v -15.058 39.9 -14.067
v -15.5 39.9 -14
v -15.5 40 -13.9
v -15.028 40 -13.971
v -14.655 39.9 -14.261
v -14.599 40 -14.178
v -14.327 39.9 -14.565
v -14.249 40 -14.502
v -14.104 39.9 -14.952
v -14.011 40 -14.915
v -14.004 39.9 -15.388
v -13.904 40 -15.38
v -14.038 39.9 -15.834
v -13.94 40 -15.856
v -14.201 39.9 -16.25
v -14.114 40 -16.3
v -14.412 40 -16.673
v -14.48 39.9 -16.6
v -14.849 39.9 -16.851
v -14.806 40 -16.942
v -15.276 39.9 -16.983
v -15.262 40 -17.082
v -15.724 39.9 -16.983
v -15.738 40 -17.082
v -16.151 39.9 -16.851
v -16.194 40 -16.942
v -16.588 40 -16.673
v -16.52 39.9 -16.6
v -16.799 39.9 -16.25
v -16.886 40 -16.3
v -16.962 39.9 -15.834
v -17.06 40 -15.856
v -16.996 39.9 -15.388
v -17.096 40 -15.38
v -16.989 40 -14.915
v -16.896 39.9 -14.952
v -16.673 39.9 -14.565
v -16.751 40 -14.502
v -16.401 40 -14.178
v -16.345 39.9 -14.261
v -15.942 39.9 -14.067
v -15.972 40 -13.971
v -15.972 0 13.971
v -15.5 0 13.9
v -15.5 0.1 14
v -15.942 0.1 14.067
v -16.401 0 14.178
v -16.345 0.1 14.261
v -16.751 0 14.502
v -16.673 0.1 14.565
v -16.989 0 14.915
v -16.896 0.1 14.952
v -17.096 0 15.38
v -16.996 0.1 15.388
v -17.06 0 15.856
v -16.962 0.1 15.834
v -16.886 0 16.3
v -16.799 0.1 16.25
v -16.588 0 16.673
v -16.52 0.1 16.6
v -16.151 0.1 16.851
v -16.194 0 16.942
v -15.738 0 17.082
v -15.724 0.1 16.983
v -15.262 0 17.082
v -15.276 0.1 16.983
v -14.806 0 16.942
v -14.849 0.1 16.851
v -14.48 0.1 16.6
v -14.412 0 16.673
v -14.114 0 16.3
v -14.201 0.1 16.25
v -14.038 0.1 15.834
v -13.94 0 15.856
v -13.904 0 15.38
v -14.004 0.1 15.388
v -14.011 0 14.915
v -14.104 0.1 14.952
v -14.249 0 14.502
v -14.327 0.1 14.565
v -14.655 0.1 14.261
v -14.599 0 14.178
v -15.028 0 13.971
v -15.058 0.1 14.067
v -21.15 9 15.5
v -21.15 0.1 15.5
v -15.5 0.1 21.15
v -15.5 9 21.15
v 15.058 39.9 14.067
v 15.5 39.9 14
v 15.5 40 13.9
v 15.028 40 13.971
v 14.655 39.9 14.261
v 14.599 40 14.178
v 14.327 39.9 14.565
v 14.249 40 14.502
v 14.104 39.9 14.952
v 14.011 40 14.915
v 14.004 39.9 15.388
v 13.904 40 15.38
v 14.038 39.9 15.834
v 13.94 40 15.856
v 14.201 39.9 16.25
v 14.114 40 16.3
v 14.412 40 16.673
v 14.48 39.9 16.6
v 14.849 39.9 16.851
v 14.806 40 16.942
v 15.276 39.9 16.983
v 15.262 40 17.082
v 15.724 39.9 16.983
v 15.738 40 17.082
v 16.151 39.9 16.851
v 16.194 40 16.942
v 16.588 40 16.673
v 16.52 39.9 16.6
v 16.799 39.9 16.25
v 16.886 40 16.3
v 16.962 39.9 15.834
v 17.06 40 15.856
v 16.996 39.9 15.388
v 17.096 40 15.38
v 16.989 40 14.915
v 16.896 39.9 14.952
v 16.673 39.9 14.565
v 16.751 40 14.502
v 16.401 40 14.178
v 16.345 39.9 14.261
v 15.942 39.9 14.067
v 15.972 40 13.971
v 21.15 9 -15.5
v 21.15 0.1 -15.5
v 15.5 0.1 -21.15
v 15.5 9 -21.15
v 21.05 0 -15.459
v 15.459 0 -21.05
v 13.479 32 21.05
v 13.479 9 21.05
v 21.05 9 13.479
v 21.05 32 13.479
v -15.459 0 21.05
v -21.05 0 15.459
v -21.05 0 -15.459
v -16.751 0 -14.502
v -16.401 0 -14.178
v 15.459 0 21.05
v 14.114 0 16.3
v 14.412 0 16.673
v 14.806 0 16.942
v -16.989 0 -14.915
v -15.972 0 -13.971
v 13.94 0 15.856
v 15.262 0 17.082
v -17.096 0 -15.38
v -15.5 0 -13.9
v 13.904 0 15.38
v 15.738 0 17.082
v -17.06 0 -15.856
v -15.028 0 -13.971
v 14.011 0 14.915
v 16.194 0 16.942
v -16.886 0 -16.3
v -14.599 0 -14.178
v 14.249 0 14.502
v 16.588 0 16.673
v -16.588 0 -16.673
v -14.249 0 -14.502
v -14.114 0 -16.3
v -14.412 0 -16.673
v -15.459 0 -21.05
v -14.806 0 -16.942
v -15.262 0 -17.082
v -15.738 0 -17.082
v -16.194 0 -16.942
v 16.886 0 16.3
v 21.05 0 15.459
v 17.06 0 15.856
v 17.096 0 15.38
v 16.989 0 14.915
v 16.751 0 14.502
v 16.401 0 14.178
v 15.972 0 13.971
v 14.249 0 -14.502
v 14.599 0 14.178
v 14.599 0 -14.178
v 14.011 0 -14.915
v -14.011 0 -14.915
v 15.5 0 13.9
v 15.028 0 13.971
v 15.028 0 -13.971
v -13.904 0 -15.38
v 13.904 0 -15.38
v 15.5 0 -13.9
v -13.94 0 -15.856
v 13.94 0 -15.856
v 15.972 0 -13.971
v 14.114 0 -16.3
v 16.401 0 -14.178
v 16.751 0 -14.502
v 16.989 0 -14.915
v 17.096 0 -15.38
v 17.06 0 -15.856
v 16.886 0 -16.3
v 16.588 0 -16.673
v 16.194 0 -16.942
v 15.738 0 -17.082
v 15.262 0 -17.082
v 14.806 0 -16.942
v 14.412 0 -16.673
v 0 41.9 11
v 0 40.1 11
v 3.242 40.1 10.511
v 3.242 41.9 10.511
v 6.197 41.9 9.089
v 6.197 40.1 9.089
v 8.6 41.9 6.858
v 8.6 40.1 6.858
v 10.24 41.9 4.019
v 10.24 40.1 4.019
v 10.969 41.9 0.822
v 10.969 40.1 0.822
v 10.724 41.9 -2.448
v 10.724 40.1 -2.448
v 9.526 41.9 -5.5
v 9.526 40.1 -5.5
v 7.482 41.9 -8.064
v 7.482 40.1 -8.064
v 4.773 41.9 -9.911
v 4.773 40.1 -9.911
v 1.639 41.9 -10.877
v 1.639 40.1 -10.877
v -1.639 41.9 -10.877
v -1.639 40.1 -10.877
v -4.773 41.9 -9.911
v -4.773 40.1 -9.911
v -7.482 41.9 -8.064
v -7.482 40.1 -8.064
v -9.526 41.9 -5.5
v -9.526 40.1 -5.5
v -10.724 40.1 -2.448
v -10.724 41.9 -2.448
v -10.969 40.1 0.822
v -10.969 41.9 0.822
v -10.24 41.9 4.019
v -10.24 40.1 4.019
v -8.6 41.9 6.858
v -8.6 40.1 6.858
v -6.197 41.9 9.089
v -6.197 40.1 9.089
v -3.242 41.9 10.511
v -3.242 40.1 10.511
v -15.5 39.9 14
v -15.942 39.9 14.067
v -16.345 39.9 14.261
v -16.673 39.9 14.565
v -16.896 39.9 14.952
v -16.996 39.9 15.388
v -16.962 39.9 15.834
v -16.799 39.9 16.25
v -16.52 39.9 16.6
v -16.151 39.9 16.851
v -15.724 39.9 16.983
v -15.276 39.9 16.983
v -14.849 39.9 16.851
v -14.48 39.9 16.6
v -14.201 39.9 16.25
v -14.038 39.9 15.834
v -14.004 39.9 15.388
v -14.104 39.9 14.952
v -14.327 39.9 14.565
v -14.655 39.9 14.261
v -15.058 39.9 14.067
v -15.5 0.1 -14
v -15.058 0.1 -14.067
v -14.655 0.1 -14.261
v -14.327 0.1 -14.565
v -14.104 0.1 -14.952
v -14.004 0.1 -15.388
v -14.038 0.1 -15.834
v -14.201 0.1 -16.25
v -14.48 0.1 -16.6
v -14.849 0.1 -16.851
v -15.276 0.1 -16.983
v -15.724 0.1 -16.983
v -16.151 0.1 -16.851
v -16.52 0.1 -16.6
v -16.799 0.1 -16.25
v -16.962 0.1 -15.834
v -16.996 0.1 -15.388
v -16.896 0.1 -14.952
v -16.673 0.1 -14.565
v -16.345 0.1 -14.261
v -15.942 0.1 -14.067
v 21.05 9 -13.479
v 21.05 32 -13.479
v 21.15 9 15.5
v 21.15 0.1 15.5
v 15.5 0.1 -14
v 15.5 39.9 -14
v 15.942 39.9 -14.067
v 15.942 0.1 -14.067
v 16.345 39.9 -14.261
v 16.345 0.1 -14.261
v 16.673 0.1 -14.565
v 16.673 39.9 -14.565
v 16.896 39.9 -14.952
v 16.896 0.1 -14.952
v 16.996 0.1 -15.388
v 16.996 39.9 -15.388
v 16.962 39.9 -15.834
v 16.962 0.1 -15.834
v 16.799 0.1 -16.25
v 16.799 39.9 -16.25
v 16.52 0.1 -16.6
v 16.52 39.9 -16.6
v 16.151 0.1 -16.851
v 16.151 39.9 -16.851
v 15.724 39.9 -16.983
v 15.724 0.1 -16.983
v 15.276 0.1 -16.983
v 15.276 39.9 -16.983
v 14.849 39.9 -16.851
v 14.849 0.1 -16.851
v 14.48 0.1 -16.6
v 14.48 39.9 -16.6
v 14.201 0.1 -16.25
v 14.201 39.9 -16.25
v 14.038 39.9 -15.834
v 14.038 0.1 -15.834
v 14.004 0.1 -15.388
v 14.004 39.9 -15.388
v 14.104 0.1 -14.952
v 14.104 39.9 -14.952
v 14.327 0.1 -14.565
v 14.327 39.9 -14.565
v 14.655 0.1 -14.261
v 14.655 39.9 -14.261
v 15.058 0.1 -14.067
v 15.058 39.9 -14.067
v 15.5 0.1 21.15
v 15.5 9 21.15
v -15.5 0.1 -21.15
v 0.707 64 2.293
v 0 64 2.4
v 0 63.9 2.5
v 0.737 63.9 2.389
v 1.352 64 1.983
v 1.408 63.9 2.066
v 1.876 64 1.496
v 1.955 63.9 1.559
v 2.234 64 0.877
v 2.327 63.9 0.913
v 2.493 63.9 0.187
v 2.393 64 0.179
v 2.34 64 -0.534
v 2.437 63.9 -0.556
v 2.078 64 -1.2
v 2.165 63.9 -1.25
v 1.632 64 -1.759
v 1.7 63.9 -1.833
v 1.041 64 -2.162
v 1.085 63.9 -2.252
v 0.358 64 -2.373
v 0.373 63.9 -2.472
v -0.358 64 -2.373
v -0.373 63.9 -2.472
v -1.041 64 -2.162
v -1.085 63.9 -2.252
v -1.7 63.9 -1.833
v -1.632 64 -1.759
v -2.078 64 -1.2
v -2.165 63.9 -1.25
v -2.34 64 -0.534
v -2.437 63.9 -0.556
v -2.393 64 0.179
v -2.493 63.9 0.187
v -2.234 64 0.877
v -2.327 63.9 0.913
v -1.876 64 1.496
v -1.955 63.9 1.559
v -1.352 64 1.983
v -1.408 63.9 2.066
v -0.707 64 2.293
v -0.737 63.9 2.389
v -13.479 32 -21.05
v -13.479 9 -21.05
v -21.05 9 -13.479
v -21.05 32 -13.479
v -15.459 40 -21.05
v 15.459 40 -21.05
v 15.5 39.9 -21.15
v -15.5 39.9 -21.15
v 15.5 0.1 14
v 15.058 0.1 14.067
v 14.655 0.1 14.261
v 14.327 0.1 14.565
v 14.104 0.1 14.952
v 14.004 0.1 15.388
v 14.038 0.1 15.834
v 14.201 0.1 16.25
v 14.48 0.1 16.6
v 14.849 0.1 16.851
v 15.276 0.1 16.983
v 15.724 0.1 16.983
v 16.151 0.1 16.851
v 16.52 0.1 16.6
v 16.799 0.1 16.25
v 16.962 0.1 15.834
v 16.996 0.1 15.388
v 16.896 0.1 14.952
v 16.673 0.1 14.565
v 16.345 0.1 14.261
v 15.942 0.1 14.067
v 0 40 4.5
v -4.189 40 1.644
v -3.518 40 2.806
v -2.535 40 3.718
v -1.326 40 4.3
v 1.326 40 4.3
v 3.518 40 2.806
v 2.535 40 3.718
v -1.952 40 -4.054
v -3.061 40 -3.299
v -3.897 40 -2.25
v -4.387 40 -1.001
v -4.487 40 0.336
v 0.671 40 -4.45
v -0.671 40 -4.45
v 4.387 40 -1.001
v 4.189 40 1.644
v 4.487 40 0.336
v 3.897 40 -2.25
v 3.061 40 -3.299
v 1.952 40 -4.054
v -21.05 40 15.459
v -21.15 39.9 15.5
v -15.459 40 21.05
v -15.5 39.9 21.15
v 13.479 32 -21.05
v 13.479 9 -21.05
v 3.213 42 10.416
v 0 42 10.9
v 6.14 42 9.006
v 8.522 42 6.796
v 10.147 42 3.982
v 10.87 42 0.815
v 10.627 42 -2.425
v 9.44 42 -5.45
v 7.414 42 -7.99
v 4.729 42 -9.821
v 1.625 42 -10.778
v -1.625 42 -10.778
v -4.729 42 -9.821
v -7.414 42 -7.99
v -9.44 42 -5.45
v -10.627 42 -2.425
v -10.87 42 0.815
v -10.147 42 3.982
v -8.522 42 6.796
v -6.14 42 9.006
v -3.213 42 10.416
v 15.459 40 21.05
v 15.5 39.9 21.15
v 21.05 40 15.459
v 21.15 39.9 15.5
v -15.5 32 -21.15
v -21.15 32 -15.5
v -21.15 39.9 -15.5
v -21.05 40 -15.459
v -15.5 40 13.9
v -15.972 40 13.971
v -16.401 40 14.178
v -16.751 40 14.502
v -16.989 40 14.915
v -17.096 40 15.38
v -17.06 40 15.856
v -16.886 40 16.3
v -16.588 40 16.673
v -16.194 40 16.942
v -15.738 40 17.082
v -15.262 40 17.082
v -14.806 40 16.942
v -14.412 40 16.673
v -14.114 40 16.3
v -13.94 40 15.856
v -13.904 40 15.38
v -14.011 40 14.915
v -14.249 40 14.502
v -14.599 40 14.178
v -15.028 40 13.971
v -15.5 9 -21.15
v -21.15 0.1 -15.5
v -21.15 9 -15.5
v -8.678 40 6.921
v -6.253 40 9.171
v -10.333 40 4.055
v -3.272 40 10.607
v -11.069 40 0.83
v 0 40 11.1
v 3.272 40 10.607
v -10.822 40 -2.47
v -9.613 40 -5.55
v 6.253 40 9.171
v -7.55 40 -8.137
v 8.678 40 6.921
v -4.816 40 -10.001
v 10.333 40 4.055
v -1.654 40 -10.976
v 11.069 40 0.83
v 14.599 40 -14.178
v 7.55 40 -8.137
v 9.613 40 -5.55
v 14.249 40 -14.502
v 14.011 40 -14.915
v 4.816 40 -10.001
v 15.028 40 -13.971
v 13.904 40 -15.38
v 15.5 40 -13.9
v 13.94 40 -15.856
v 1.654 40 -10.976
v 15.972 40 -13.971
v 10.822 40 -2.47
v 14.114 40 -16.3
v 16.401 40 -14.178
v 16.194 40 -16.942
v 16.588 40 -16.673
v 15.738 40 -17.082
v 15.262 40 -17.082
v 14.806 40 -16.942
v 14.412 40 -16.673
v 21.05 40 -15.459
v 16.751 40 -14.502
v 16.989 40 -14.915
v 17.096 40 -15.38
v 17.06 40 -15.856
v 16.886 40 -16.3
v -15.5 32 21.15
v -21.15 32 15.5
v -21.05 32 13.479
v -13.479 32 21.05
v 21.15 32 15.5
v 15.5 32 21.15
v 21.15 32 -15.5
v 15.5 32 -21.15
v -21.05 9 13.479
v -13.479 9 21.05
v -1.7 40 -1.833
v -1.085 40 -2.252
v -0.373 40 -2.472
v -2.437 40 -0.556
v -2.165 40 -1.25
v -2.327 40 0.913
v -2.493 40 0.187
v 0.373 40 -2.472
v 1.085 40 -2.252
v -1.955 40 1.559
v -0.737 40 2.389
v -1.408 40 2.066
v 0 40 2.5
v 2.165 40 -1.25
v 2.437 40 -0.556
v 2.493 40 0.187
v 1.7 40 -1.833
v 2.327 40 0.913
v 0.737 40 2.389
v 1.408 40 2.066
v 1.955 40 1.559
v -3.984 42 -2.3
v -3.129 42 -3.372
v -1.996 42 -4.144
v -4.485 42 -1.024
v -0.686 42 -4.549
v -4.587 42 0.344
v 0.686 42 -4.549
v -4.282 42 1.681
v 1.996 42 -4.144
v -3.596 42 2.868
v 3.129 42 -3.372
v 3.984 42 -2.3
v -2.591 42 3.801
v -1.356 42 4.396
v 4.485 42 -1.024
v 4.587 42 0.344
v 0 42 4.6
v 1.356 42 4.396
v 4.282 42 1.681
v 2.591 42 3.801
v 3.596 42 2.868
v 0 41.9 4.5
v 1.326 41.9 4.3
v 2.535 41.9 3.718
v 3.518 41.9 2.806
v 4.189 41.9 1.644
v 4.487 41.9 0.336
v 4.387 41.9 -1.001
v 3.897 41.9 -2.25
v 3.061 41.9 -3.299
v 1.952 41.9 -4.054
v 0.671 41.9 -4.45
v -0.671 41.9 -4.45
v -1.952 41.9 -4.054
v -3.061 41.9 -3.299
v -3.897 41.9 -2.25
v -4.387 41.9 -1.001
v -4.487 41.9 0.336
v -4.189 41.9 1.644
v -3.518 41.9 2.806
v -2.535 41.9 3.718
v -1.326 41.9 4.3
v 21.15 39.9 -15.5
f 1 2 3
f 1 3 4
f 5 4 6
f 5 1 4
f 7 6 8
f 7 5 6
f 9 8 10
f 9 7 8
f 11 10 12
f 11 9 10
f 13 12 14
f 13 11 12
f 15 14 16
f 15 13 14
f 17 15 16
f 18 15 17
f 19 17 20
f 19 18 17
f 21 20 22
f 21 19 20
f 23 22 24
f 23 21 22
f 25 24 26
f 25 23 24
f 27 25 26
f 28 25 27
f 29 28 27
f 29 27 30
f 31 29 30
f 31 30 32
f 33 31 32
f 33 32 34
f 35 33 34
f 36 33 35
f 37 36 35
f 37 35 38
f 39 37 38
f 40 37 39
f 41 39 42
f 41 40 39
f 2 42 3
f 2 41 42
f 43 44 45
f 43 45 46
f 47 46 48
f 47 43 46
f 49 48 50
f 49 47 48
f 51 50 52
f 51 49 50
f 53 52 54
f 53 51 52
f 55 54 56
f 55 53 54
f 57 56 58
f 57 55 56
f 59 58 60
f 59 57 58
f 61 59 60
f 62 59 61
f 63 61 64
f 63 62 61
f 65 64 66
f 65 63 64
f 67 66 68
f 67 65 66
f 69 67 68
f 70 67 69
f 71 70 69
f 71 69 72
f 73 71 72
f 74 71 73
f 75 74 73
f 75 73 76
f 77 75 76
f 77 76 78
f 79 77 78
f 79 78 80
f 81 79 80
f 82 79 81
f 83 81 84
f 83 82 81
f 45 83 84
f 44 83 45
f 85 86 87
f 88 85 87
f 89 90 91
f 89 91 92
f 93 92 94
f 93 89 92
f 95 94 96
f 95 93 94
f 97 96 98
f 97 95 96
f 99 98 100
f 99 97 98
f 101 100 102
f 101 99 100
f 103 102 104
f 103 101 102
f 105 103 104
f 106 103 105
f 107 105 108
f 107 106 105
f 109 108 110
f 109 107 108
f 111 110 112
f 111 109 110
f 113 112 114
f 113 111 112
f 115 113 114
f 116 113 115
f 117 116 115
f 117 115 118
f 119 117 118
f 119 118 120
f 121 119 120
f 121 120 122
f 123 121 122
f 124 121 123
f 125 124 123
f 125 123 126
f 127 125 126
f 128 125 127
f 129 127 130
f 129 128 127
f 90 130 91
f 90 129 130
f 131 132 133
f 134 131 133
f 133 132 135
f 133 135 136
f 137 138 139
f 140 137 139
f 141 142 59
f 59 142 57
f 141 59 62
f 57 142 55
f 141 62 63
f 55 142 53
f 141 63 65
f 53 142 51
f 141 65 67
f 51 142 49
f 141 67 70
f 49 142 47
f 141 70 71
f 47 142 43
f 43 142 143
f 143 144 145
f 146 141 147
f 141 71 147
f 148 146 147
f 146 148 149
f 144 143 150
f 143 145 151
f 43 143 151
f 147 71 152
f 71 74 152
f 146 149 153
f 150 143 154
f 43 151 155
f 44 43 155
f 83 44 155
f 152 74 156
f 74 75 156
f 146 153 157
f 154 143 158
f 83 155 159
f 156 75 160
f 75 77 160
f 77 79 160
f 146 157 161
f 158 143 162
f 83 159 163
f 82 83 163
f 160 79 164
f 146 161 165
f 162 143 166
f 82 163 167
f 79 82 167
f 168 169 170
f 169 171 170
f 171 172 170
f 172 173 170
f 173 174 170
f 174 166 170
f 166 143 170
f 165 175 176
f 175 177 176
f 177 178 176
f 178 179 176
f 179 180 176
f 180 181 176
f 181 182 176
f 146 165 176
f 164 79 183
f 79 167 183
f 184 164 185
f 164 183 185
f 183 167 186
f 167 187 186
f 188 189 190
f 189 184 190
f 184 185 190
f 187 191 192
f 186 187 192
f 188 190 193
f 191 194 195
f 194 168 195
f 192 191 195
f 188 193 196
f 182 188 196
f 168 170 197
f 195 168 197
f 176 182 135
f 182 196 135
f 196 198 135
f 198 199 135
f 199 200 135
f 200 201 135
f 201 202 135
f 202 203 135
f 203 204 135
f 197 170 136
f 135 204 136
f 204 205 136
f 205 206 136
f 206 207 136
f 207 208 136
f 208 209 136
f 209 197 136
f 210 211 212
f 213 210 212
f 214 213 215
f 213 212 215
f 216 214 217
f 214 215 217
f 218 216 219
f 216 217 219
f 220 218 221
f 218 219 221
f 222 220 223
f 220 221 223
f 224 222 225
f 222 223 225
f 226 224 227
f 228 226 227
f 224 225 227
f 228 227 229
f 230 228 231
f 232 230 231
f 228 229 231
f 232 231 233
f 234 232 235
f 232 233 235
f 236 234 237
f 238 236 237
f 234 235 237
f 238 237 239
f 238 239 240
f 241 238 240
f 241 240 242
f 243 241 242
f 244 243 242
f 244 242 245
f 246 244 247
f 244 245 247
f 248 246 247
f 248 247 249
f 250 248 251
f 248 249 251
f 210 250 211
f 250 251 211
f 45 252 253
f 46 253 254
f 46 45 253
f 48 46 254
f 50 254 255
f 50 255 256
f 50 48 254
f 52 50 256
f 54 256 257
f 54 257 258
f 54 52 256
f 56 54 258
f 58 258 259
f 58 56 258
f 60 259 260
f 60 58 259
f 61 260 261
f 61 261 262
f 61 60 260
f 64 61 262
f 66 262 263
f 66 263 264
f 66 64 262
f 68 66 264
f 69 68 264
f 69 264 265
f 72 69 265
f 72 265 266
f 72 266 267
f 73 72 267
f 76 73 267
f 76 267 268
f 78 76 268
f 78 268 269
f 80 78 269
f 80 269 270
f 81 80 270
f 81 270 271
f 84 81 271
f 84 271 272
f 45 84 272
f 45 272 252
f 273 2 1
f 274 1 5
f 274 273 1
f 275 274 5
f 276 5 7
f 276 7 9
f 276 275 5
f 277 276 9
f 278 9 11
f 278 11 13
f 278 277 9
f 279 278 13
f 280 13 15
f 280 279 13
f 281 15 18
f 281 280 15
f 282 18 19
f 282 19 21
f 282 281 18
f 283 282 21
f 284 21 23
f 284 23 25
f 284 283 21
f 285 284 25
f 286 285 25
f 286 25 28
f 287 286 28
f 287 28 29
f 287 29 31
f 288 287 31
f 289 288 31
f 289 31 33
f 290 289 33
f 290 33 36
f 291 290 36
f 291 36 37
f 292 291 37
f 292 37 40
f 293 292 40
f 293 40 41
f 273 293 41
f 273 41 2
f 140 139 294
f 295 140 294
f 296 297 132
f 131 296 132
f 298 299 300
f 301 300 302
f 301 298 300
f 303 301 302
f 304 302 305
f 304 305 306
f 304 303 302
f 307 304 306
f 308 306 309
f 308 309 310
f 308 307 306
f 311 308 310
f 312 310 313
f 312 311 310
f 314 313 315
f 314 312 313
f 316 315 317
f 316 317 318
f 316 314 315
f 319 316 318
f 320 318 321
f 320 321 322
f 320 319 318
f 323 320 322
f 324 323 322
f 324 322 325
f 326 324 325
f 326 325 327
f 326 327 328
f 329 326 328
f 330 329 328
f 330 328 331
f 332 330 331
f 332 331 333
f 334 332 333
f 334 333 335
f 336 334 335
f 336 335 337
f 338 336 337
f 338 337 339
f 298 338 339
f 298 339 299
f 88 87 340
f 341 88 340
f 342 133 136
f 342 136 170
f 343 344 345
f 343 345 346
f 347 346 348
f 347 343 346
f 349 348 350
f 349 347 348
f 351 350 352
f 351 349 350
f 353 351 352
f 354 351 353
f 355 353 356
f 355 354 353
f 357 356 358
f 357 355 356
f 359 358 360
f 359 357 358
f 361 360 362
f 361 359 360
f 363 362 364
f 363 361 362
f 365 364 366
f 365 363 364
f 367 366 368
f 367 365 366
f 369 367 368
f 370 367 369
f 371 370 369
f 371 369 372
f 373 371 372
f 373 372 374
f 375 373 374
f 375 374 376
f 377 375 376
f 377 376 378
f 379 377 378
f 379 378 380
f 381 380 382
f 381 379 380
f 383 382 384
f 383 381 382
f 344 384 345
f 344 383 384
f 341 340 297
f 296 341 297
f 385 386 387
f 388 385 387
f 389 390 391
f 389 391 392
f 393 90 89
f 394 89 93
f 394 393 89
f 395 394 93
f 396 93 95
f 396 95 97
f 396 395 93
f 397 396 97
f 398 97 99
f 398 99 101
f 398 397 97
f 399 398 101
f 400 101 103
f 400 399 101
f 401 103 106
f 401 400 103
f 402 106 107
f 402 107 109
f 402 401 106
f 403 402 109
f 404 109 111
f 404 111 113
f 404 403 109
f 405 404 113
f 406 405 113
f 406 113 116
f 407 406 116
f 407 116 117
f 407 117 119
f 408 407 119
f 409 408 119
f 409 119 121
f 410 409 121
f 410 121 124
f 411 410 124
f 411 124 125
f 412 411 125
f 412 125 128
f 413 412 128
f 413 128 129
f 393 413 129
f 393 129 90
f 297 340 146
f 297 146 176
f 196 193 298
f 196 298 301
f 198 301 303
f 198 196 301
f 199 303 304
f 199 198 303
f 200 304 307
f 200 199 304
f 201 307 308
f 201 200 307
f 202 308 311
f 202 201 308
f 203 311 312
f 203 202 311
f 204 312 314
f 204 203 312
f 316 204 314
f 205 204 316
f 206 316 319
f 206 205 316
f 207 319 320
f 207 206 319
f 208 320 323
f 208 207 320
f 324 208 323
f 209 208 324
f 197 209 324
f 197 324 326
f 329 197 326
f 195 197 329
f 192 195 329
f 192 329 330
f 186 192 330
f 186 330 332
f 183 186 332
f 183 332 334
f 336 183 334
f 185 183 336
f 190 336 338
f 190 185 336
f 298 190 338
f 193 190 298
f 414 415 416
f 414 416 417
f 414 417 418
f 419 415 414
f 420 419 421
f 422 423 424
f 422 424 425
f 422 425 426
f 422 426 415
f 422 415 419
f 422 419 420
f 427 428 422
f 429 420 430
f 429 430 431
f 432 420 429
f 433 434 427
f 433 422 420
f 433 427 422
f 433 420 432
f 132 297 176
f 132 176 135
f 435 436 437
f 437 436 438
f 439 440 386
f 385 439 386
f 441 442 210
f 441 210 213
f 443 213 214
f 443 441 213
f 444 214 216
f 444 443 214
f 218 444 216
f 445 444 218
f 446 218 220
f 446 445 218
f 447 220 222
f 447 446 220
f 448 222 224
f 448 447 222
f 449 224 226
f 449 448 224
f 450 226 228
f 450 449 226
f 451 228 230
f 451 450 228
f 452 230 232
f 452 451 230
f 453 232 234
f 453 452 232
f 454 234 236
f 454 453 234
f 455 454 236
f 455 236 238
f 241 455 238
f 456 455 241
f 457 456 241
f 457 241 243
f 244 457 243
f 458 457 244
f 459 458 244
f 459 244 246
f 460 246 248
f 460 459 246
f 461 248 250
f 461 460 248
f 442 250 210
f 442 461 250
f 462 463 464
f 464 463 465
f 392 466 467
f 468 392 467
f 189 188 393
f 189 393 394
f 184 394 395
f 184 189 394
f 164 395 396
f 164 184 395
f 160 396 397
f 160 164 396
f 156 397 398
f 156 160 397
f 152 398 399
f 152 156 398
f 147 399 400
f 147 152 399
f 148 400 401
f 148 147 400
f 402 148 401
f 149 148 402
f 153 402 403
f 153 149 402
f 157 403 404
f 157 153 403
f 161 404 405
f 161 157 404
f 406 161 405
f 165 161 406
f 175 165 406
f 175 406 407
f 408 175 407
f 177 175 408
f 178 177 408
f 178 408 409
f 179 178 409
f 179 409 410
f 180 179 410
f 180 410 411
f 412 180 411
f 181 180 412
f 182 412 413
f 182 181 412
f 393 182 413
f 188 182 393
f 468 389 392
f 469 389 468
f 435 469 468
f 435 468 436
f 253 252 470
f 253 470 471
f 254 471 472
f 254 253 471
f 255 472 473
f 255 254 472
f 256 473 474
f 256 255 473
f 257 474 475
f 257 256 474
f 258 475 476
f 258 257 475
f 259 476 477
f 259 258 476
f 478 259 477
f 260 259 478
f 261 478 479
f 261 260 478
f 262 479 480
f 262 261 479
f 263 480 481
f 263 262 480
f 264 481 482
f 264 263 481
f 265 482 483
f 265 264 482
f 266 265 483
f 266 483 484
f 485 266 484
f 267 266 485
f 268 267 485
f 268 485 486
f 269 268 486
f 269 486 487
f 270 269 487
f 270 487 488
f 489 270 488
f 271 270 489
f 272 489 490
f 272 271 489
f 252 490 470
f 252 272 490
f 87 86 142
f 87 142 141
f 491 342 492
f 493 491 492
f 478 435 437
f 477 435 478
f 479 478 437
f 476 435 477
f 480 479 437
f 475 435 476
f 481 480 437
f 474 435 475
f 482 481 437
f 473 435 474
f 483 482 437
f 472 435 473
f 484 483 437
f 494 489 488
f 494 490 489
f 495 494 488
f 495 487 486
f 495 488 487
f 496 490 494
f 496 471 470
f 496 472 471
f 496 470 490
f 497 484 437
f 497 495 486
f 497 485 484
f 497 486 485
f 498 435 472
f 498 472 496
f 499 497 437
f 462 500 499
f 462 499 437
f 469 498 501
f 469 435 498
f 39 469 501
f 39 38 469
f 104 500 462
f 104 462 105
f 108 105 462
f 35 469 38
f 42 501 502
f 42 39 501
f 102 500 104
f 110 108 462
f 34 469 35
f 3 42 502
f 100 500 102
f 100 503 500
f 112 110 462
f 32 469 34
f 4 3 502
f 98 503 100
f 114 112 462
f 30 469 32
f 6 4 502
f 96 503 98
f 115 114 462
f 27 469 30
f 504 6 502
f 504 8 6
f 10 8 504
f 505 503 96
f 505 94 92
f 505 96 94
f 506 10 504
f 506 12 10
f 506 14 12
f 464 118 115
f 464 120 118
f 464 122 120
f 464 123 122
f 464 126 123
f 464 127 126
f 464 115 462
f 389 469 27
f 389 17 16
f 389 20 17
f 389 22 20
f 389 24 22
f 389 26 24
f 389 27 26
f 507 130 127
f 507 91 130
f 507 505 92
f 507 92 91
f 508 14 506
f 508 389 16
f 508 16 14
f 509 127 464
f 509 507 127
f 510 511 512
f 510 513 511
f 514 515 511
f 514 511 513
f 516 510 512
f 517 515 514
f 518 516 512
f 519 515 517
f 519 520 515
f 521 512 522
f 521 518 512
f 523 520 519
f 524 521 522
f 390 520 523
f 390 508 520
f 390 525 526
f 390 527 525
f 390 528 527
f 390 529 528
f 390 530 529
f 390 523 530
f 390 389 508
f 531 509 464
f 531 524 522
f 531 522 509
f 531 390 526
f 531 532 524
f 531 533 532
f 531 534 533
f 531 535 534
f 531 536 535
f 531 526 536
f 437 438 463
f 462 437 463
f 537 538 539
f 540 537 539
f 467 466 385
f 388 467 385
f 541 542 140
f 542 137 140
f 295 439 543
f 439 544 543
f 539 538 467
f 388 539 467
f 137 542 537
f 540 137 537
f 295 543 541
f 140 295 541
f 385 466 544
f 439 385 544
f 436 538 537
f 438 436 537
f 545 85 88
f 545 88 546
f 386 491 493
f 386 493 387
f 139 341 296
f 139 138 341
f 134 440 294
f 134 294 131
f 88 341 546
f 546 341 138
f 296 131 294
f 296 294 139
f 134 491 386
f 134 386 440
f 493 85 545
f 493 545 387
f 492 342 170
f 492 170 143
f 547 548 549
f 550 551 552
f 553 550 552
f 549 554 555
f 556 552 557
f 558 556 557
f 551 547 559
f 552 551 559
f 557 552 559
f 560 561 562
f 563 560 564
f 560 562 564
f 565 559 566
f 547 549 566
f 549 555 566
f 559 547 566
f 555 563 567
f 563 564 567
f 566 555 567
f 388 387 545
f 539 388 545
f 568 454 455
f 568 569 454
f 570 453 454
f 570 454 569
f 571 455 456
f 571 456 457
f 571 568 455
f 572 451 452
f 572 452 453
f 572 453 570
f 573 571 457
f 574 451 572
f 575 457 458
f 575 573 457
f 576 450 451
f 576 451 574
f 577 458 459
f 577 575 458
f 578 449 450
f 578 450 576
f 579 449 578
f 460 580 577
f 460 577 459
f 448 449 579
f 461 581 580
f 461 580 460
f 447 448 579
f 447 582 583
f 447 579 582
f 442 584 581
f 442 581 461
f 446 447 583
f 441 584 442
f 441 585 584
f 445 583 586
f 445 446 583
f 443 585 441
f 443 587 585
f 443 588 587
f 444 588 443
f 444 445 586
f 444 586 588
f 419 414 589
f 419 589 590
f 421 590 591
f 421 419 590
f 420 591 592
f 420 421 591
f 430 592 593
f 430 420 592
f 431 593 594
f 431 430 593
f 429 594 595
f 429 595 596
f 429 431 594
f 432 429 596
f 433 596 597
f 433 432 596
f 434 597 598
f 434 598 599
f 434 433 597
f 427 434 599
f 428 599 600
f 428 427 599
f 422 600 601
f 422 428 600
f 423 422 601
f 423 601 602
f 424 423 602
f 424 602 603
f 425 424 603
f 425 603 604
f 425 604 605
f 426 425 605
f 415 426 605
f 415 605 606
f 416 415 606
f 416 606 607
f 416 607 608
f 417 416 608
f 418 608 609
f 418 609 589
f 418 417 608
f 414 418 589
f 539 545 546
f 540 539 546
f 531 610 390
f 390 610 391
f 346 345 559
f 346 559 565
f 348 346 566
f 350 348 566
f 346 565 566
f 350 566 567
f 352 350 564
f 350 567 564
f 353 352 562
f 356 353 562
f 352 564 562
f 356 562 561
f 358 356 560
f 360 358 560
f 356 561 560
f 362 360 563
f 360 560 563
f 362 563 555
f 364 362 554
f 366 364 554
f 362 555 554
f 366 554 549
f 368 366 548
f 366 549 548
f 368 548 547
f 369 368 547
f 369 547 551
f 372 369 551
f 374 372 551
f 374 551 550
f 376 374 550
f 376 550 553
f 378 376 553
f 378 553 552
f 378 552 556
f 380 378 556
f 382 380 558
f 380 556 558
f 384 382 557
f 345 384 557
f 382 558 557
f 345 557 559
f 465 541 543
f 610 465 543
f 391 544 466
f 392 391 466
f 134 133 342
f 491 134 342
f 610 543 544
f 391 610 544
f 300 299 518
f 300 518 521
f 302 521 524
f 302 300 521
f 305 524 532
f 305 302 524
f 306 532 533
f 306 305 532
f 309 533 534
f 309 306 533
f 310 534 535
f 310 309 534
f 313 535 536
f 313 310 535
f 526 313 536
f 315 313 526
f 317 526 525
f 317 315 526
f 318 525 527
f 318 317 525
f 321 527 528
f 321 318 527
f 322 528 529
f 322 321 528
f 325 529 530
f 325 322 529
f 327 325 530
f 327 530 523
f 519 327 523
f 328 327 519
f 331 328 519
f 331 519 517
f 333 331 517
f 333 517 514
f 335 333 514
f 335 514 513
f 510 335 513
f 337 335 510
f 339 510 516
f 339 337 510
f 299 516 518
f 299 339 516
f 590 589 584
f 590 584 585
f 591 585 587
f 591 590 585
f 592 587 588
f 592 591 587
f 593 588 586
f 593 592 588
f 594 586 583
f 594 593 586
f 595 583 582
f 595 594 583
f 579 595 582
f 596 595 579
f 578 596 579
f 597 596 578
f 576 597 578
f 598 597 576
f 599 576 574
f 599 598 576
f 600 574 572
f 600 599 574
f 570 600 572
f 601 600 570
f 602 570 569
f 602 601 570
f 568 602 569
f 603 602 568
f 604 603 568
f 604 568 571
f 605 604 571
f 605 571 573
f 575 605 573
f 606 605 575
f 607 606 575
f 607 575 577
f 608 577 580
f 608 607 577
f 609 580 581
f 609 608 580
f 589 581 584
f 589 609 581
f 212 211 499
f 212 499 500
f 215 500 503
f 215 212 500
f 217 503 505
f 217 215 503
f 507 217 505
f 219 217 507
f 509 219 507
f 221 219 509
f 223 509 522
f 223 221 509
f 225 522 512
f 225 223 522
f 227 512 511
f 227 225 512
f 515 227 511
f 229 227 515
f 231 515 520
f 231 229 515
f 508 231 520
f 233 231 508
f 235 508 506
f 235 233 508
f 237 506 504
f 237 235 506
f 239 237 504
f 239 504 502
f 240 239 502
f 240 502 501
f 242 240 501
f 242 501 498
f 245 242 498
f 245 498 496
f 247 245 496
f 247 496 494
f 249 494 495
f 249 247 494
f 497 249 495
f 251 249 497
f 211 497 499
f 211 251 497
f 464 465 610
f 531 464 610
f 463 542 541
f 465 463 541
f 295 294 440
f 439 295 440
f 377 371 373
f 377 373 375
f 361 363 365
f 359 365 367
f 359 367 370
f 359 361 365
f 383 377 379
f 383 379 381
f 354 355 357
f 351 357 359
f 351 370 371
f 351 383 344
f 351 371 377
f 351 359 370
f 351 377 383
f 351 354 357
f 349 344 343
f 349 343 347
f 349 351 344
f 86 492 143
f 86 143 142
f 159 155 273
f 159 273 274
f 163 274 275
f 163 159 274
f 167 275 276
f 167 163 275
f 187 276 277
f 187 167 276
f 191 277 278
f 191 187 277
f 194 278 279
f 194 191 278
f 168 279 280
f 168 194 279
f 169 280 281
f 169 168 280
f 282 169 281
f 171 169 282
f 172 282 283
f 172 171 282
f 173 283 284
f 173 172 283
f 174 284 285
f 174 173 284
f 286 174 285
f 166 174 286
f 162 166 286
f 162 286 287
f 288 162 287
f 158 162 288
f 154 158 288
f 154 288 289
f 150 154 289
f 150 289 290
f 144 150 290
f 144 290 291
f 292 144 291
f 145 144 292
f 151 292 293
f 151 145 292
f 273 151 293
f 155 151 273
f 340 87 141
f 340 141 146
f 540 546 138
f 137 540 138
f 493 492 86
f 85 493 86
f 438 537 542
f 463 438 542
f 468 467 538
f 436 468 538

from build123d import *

# Parameters (mm, degrees)
SKETCH1_R           = 1.5
BOSS_EXTRUDE1_DEPTH = 9
SKETCH4_R           = 1.5
BOSS_EXTRUDE4_DEPTH = 23
SKETCH5_R           = 1.5
BOSS_EXTRUDE6_DEPTH = 8
SKETCH2_R           = 11
SKETCH2_R_2         = 4.5
BOSS_EXTRUDE2_DEPTH = 2
SKETCH3_R           = 2.5
BOSS_EXTRUDE3_DEPTH = 24
CHAMFER1_SIZE       = 0.1
CHAMFER2_SIZE       = 0.1


with BuildPart() as part:
    # Sketch1 → Boss-Extrude1 (new body)
    with BuildSketch(Plane(origin=(0, 0, 0), x_dir=(1, 0, 0), z_dir=(0, 1, 0))):
        Polygon((-15.5, -21.15), (15.5, -21.15), (21.15, -15.5), (21.15, 15.5), (15.5, 21.15), (-15.5, 21.15), (-21.15, 15.5), (-21.15, -15.5), align=None)
        with Locations(Location((-15.5, 15.5, 0), (0, 0, 270))):
            Circle(SKETCH1_R, mode=Mode.SUBTRACT)
        with Locations(Location((15.5, -15.5, 0), (0, 0, 90))):
            Circle(SKETCH1_R, mode=Mode.SUBTRACT)
        with Locations(Location((15.5, 15.5, 0), (0, 0, 270))):
            Circle(SKETCH1_R, mode=Mode.SUBTRACT)
        with Locations(Location((-15.5, -15.5, 0), (0, 0, 90))):
            Circle(SKETCH1_R, mode=Mode.SUBTRACT)
    extrude(amount=BOSS_EXTRUDE1_DEPTH)

    # Sketch4 → Boss-Extrude4 (add)
    with BuildSketch(Plane(origin=(0, 9, 0), x_dir=(1, 0, 0), z_dir=(0, 1, 0))):
        Polygon((13.478679656, 21.05), (-13.478679656, 21.05), (-21.05, 13.478679656), (-21.05, -13.478679656), (-13.478679656, -21.05), (13.478679656, -21.05), (21.05, -13.478679656), (21.05, 13.478679656), align=None)
        with Locations(Location((-15.5, 15.5, 0), (0, 0, 270))):
            Circle(SKETCH4_R, mode=Mode.SUBTRACT)
        with Locations(Location((15.5, 15.5, 0), (0, 0, 270))):
            Circle(SKETCH4_R, mode=Mode.SUBTRACT)
        with Locations(Location((15.5, -15.5, 0), (0, 0, 90))):
            Circle(SKETCH4_R, mode=Mode.SUBTRACT)
        with Locations(Location((-15.5, -15.5, 0), (0, 0, 90))):
            Circle(SKETCH4_R, mode=Mode.SUBTRACT)
    extrude(amount=BOSS_EXTRUDE4_DEPTH)

    # Sketch5 → Boss-Extrude6 (add)
    with BuildSketch(Plane(origin=(0, 32, 0), x_dir=(1, 0, 0), z_dir=(0, 1, 0))):
        Polygon((-15.5, 21.15), (-21.15, 15.5), (-21.15, -15.5), (-15.5, -21.15), (15.5, -21.15), (21.15, -15.5), (21.15, 15.5), (15.5, 21.15), align=None)
        with Locations(Location((15.5, 15.5, 0), (0, 0, 270))):
            Circle(SKETCH5_R, mode=Mode.SUBTRACT)
        with Locations(Location((-15.5, 15.5, 0), (0, 0, 270))):
            Circle(SKETCH5_R, mode=Mode.SUBTRACT)
        with Locations(Location((-15.5, -15.5, 0), (0, 0, 90))):
            Circle(SKETCH5_R, mode=Mode.SUBTRACT)
        with Locations(Location((15.5, -15.5, 0), (0, 0, 90))):
            Circle(SKETCH5_R, mode=Mode.SUBTRACT)
    extrude(amount=BOSS_EXTRUDE6_DEPTH)

    # Sketch2 → Boss-Extrude2 (add)
    with BuildSketch(Plane(origin=(0, 40, 0), x_dir=(1, 0, 0), z_dir=(0, 1, 0))):
        with Locations(Location((0, 0, 0), (0, 0, 270))):
            Circle(SKETCH2_R)
        with Locations(Location((0, 0, 0), (0, 0, 270))):
            Circle(SKETCH2_R_2, mode=Mode.SUBTRACT)
    extrude(amount=BOSS_EXTRUDE2_DEPTH)

    # Chamfer1
    chamfer1_edges = [part.edges().sort_by_distance(p)[0] for p in [
        (-21.15, 0, 0),
        (-18.325, 0, -18.325),
        (0, 42, -11),
        (0, 40, -11),
        (0, 42, -4.5),
        (-15.5, 0, -17),
        (15.5, 0, 17),
        (15.5, 0, -17),
        (-15.5, 0, 17),
        (0, 40, -21.15),
        (-18.325, 40, -18.325),
        (-21.15, 40, 0),
        (-18.325, 40, 18.325),
        (0, 40, 21.15),
        (18.325, 40, 18.325),
        (21.15, 40, 0),
        (18.325, 40, -18.325),
        (0, 0, -21.15),
        (15.5, 40, -17),
        (18.325, 0, -18.325),
        (-15.5, 40, -17),
        (-15.5, 40, 17),
        (15.5, 40, 17),
        (21.15, 0, 0),
        (18.325, 0, 18.325),
        (0, 0, 21.15),
        (-18.325, 0, 18.325),
    ]]
    chamfer(chamfer1_edges, length=CHAMFER1_SIZE)


with BuildPart() as body_2:
    # Sketch3 → Boss-Extrude3 (new body)
    with BuildSketch(Plane(origin=(0, 40, 0), x_dir=(1, 0, 0), z_dir=(0, 1, 0))):
        with Locations(Location((0, 0, 0), (0, 0, 270))):
            Circle(SKETCH3_R)
    extrude(amount=BOSS_EXTRUDE3_DEPTH)

    # Chamfer2
    chamfer2_edges = [body_2.edges().sort_by_distance(p)[0] for p in [
        (0, 64, -2.5),
    ]]
    chamfer(chamfer2_edges, length=CHAMFER2_SIZE)


solid = Compound([part.part, body_2.part])
